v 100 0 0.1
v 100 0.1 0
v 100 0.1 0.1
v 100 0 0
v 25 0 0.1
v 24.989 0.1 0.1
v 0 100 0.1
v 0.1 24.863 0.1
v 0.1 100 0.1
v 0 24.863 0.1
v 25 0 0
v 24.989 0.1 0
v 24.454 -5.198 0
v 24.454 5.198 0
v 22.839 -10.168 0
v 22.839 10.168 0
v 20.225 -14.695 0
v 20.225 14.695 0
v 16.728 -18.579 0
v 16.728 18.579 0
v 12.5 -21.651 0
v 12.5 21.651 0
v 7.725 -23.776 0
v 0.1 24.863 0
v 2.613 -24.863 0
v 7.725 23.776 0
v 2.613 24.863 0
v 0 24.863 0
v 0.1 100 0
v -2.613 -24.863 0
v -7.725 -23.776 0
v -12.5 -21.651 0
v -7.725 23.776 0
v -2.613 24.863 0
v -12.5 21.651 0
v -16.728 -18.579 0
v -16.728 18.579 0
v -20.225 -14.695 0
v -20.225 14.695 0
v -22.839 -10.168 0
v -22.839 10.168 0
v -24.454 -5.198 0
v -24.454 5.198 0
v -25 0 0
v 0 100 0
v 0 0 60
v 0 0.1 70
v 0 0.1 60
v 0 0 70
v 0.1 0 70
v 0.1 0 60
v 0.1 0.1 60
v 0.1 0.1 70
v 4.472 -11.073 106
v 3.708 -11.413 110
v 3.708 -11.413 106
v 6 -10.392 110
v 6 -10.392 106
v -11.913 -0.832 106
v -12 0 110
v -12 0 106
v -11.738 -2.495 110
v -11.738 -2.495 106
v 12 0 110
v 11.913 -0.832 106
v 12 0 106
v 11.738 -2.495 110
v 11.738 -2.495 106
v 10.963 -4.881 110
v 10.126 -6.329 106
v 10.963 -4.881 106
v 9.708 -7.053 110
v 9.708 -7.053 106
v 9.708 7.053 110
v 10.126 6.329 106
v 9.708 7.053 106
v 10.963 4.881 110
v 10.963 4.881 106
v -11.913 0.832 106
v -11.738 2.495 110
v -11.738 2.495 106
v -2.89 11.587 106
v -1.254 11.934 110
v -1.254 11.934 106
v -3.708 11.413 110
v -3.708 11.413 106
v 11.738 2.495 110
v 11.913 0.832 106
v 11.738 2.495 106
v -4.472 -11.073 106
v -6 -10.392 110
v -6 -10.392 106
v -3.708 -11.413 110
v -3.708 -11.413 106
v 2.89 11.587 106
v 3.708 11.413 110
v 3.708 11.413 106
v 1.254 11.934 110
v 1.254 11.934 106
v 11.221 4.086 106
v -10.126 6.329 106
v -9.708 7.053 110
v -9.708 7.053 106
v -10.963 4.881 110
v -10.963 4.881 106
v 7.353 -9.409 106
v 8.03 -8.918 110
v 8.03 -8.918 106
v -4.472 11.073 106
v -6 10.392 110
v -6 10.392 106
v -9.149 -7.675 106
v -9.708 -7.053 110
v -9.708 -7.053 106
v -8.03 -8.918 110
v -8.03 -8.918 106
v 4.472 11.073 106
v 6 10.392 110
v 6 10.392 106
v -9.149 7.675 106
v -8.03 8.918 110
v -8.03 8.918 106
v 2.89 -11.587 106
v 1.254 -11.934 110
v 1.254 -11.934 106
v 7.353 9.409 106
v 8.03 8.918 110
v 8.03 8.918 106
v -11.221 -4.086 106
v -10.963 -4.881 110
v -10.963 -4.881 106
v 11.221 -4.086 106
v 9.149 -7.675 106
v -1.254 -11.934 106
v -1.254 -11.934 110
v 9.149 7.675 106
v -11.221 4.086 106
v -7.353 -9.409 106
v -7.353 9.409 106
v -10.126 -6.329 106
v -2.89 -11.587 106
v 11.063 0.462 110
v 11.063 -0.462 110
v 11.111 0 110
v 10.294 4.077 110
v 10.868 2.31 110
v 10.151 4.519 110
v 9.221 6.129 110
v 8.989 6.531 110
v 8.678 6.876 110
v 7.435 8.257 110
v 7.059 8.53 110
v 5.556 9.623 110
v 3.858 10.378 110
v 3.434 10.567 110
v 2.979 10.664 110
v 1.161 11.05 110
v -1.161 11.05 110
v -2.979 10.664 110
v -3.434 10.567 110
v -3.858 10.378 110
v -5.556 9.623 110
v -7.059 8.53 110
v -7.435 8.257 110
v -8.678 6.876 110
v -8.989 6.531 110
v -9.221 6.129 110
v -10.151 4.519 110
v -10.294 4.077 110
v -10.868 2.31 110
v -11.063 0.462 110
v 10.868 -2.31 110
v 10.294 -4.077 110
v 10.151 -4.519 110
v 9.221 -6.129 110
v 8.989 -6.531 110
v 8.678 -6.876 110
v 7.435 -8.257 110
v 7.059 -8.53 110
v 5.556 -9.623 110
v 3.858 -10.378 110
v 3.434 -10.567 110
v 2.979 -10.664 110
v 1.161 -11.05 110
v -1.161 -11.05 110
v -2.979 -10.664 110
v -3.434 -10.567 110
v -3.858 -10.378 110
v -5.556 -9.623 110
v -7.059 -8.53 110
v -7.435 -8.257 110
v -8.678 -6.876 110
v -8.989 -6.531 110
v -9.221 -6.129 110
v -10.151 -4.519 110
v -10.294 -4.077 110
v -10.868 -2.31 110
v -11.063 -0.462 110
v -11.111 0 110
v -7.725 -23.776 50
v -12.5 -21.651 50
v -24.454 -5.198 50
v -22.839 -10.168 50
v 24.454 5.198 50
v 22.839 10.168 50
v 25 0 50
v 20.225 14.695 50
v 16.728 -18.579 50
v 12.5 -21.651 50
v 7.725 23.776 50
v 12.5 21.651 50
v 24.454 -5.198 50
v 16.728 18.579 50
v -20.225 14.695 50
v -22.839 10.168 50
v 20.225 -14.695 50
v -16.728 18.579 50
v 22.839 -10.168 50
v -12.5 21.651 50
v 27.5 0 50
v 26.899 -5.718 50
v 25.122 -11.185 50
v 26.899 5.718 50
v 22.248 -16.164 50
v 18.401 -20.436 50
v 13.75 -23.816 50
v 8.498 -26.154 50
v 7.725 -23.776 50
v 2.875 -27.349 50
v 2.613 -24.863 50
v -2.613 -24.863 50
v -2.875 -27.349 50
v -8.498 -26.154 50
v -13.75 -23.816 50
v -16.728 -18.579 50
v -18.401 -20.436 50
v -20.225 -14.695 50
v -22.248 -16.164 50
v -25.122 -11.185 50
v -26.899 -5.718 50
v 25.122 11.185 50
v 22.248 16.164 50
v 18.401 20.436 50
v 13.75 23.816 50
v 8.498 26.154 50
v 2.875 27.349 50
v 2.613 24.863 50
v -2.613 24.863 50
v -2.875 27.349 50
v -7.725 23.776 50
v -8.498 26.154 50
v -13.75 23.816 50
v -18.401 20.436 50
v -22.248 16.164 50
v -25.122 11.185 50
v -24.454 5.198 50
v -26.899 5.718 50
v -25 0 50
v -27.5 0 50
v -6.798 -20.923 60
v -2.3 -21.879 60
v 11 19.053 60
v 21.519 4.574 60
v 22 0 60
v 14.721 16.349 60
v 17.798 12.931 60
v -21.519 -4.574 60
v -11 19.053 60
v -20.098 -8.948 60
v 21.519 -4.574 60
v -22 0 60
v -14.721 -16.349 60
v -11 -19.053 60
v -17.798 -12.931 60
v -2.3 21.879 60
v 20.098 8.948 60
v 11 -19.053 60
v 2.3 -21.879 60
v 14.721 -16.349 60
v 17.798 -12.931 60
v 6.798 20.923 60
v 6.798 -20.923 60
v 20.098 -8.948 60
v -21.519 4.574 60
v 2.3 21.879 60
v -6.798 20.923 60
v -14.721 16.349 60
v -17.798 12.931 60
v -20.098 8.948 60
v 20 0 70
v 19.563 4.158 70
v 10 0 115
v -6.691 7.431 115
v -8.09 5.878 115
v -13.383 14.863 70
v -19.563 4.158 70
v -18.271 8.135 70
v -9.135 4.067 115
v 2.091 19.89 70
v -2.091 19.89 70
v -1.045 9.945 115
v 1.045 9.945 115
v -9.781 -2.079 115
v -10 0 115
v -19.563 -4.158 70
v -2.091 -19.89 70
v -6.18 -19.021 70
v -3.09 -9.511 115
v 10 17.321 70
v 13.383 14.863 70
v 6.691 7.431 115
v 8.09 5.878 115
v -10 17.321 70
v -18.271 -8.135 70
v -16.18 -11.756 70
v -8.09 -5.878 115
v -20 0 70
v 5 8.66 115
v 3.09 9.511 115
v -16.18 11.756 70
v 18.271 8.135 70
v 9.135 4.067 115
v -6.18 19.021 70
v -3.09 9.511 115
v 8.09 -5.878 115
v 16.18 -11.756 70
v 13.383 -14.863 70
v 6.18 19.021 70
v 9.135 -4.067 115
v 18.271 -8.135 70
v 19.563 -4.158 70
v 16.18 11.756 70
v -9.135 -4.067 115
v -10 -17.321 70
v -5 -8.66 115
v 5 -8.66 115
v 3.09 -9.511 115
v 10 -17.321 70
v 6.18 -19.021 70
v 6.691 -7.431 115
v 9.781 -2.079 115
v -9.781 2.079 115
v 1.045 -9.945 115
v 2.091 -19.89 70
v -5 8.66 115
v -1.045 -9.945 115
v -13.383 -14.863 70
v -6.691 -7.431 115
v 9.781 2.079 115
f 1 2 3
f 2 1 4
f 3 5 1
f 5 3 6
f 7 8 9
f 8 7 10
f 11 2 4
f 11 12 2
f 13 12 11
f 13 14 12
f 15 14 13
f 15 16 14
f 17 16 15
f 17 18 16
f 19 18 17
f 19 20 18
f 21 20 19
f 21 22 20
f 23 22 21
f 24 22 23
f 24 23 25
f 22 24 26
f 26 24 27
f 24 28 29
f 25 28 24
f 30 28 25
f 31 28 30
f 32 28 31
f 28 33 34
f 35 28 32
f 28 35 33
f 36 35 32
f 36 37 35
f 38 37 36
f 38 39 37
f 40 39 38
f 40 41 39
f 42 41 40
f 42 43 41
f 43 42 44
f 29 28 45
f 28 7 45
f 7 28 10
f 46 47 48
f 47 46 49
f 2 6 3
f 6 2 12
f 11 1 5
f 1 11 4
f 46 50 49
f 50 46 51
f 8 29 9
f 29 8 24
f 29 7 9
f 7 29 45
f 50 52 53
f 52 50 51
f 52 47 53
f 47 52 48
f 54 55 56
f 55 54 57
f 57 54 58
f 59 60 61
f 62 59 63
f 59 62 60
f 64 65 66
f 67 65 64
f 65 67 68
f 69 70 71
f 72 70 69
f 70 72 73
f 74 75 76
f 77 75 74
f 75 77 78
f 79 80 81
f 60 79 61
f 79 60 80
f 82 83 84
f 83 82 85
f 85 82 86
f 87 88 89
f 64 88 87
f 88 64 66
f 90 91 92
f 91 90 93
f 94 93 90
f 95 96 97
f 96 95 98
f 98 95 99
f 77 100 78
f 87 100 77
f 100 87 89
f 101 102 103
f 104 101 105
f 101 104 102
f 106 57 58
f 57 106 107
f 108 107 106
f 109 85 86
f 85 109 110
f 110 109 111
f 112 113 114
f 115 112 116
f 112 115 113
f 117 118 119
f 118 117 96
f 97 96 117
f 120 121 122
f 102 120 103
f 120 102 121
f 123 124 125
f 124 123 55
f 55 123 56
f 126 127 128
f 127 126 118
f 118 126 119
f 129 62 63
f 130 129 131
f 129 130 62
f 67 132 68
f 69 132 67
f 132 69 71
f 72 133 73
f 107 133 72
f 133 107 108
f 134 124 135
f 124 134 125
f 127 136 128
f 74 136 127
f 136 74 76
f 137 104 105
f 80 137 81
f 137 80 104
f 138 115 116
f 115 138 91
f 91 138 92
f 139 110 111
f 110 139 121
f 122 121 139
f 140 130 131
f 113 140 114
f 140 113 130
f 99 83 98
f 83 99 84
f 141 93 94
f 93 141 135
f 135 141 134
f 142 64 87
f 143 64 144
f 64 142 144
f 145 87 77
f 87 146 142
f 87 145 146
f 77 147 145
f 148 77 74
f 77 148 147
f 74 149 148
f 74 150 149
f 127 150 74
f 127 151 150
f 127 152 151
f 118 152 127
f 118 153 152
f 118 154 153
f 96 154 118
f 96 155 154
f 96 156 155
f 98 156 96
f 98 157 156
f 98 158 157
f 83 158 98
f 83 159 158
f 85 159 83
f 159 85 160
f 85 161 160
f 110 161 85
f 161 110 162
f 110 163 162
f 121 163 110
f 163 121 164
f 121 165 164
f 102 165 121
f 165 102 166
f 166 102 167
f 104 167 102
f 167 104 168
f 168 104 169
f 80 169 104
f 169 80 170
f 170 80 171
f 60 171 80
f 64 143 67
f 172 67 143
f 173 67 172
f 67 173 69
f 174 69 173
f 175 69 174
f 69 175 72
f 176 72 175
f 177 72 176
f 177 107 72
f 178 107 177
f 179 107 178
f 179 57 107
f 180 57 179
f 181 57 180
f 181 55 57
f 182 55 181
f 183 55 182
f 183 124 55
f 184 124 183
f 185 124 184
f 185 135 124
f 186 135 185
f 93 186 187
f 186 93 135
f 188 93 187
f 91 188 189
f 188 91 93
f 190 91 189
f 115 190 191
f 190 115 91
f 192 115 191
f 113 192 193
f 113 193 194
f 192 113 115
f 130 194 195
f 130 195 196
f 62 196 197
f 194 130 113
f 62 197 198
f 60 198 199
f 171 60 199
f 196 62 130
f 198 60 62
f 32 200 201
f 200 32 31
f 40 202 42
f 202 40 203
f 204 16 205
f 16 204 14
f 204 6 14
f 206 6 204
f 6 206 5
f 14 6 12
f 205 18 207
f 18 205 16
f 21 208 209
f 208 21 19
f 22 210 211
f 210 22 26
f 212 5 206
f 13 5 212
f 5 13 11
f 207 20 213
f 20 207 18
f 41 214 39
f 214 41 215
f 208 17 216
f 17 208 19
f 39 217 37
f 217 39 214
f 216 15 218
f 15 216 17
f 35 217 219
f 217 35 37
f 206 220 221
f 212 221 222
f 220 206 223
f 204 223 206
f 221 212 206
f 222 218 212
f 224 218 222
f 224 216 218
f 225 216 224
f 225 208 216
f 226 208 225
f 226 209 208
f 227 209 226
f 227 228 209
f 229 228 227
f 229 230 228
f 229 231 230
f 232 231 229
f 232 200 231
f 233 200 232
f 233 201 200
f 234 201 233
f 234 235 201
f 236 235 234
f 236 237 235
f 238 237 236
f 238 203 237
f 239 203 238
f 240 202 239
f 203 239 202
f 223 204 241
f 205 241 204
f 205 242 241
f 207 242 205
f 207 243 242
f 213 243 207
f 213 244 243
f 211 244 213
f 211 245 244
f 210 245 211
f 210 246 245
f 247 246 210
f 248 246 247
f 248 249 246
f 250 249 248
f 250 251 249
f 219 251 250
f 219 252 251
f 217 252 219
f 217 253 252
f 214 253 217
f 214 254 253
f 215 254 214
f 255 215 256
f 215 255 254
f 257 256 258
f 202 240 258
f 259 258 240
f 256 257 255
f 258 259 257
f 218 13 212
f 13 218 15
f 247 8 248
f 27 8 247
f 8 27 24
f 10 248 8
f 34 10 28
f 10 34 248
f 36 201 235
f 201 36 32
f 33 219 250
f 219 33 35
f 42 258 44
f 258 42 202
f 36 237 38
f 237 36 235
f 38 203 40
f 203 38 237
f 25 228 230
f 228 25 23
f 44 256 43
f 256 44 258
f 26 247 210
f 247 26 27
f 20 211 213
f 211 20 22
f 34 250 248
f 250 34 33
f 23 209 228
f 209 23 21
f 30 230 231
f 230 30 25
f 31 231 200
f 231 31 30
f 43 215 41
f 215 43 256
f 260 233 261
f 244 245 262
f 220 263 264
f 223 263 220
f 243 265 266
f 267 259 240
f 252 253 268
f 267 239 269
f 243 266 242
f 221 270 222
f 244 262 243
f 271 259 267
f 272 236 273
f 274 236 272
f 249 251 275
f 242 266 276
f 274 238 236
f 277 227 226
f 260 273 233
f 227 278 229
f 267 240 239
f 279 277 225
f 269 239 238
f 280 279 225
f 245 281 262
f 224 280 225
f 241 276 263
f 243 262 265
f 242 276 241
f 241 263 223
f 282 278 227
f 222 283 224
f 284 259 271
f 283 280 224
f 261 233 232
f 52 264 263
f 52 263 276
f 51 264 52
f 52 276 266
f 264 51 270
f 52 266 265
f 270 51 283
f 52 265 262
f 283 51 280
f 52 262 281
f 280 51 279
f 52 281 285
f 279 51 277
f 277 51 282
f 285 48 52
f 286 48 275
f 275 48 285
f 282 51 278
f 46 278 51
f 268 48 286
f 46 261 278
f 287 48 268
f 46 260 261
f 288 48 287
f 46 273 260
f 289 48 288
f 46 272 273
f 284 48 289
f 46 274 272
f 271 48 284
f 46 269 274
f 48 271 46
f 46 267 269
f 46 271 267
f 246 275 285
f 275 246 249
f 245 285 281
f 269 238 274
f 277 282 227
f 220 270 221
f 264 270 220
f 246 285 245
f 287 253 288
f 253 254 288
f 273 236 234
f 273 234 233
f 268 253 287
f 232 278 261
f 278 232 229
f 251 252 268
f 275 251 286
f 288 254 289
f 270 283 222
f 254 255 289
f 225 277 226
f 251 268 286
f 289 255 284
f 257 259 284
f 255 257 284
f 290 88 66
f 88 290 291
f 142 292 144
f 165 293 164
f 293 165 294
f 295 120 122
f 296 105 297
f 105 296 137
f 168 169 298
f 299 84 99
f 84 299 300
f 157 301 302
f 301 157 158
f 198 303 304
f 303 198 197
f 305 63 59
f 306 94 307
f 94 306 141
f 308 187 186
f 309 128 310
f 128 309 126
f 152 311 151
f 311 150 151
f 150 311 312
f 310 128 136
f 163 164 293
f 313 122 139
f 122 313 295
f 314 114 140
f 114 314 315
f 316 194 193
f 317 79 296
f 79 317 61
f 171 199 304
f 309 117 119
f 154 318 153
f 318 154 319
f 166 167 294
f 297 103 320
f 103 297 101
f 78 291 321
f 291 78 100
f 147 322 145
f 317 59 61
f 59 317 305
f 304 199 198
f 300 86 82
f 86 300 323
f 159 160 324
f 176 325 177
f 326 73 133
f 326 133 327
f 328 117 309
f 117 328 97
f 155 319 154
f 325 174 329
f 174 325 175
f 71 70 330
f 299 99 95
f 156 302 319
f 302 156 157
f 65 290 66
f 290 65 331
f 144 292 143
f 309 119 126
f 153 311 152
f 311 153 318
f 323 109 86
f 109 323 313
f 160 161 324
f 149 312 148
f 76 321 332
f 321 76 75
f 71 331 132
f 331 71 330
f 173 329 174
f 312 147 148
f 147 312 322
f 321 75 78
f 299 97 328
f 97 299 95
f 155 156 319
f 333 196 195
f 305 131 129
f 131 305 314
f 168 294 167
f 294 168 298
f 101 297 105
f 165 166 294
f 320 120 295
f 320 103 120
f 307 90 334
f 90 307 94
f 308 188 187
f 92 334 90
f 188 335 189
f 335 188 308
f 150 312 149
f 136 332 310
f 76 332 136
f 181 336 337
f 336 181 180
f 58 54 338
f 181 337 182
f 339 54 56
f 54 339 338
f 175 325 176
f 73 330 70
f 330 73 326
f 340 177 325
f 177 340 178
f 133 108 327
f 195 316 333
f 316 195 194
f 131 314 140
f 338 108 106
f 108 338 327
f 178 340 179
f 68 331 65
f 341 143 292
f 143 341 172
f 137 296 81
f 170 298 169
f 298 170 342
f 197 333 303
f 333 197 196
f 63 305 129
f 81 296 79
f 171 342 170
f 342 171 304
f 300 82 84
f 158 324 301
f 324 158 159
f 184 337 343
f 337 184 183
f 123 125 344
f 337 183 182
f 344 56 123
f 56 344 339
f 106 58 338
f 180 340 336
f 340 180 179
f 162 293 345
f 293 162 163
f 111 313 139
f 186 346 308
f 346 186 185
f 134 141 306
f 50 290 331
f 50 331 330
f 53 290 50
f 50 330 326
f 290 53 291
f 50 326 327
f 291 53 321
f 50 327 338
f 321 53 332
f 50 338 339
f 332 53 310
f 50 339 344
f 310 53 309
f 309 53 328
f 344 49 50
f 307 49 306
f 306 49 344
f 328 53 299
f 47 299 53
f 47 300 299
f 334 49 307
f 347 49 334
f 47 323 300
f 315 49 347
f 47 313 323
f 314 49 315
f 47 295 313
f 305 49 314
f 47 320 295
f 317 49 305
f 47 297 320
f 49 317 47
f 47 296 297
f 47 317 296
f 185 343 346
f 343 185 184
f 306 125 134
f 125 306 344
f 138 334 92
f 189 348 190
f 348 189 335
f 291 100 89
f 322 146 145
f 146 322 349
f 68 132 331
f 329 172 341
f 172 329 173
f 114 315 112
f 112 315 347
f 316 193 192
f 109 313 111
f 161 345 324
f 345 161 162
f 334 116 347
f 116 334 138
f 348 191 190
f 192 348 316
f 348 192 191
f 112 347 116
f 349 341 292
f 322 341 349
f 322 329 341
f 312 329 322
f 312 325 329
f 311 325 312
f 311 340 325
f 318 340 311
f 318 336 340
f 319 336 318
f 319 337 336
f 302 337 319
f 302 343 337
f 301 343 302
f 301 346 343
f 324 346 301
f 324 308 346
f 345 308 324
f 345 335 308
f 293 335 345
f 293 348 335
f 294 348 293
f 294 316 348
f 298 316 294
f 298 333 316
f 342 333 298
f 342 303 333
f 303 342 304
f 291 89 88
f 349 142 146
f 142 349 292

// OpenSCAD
    // Combined Scene

    // Permanent Model
    
    // Permanent Model (Black)
    color([0, 0, 0]) {
        // Your permanent model code here
        cube([100,0.1,0.1], center = false);
        cube([0.1,100,0.1], center = false);
        cube([0.1,0.1,100], center = false);
    }
    

    // Dynamic Model
    cylinder(h = 50, r = 25); // Main body with slight curves
translate([0, 0, 50]) {
    scale([1.1, 1.1, 0.5]) 
        cylinder(h = 20, r1 = 25, r2 = 20); // Rounded shoulder
}
translate([0, 0, 70]) {
    scale([1, 1, 1.5]) 
        cylinder(h = 30, r1 = 20, r2 = 10); // Taller, more conical neck
}
translate([0, 0, 100]) {
    difference() {
        cylinder(h = 10, r = 12); // Cap body with pronounced lip
        translate([0, 0, -1]) 
            cylinder(h = 11, r = 11); // Indentation for cap
    }
}
translate([0, 0, 90]) {
    for (i = [0 : 11]) {
        rotate(i * 30) {
            translate([0, 6, 0]) {
                cube([1, 0.3, 4]); // Ribbed texture on neck
            }
        }
    }
}
translate([0, 0, 40]) {
    difference() {
        cube([20, 0.5, 8]); // Labeling area
        translate([0, 0.05, 0]) 
            cube([20, 0.4, 8]); // Indentation for label
    }
}
    
